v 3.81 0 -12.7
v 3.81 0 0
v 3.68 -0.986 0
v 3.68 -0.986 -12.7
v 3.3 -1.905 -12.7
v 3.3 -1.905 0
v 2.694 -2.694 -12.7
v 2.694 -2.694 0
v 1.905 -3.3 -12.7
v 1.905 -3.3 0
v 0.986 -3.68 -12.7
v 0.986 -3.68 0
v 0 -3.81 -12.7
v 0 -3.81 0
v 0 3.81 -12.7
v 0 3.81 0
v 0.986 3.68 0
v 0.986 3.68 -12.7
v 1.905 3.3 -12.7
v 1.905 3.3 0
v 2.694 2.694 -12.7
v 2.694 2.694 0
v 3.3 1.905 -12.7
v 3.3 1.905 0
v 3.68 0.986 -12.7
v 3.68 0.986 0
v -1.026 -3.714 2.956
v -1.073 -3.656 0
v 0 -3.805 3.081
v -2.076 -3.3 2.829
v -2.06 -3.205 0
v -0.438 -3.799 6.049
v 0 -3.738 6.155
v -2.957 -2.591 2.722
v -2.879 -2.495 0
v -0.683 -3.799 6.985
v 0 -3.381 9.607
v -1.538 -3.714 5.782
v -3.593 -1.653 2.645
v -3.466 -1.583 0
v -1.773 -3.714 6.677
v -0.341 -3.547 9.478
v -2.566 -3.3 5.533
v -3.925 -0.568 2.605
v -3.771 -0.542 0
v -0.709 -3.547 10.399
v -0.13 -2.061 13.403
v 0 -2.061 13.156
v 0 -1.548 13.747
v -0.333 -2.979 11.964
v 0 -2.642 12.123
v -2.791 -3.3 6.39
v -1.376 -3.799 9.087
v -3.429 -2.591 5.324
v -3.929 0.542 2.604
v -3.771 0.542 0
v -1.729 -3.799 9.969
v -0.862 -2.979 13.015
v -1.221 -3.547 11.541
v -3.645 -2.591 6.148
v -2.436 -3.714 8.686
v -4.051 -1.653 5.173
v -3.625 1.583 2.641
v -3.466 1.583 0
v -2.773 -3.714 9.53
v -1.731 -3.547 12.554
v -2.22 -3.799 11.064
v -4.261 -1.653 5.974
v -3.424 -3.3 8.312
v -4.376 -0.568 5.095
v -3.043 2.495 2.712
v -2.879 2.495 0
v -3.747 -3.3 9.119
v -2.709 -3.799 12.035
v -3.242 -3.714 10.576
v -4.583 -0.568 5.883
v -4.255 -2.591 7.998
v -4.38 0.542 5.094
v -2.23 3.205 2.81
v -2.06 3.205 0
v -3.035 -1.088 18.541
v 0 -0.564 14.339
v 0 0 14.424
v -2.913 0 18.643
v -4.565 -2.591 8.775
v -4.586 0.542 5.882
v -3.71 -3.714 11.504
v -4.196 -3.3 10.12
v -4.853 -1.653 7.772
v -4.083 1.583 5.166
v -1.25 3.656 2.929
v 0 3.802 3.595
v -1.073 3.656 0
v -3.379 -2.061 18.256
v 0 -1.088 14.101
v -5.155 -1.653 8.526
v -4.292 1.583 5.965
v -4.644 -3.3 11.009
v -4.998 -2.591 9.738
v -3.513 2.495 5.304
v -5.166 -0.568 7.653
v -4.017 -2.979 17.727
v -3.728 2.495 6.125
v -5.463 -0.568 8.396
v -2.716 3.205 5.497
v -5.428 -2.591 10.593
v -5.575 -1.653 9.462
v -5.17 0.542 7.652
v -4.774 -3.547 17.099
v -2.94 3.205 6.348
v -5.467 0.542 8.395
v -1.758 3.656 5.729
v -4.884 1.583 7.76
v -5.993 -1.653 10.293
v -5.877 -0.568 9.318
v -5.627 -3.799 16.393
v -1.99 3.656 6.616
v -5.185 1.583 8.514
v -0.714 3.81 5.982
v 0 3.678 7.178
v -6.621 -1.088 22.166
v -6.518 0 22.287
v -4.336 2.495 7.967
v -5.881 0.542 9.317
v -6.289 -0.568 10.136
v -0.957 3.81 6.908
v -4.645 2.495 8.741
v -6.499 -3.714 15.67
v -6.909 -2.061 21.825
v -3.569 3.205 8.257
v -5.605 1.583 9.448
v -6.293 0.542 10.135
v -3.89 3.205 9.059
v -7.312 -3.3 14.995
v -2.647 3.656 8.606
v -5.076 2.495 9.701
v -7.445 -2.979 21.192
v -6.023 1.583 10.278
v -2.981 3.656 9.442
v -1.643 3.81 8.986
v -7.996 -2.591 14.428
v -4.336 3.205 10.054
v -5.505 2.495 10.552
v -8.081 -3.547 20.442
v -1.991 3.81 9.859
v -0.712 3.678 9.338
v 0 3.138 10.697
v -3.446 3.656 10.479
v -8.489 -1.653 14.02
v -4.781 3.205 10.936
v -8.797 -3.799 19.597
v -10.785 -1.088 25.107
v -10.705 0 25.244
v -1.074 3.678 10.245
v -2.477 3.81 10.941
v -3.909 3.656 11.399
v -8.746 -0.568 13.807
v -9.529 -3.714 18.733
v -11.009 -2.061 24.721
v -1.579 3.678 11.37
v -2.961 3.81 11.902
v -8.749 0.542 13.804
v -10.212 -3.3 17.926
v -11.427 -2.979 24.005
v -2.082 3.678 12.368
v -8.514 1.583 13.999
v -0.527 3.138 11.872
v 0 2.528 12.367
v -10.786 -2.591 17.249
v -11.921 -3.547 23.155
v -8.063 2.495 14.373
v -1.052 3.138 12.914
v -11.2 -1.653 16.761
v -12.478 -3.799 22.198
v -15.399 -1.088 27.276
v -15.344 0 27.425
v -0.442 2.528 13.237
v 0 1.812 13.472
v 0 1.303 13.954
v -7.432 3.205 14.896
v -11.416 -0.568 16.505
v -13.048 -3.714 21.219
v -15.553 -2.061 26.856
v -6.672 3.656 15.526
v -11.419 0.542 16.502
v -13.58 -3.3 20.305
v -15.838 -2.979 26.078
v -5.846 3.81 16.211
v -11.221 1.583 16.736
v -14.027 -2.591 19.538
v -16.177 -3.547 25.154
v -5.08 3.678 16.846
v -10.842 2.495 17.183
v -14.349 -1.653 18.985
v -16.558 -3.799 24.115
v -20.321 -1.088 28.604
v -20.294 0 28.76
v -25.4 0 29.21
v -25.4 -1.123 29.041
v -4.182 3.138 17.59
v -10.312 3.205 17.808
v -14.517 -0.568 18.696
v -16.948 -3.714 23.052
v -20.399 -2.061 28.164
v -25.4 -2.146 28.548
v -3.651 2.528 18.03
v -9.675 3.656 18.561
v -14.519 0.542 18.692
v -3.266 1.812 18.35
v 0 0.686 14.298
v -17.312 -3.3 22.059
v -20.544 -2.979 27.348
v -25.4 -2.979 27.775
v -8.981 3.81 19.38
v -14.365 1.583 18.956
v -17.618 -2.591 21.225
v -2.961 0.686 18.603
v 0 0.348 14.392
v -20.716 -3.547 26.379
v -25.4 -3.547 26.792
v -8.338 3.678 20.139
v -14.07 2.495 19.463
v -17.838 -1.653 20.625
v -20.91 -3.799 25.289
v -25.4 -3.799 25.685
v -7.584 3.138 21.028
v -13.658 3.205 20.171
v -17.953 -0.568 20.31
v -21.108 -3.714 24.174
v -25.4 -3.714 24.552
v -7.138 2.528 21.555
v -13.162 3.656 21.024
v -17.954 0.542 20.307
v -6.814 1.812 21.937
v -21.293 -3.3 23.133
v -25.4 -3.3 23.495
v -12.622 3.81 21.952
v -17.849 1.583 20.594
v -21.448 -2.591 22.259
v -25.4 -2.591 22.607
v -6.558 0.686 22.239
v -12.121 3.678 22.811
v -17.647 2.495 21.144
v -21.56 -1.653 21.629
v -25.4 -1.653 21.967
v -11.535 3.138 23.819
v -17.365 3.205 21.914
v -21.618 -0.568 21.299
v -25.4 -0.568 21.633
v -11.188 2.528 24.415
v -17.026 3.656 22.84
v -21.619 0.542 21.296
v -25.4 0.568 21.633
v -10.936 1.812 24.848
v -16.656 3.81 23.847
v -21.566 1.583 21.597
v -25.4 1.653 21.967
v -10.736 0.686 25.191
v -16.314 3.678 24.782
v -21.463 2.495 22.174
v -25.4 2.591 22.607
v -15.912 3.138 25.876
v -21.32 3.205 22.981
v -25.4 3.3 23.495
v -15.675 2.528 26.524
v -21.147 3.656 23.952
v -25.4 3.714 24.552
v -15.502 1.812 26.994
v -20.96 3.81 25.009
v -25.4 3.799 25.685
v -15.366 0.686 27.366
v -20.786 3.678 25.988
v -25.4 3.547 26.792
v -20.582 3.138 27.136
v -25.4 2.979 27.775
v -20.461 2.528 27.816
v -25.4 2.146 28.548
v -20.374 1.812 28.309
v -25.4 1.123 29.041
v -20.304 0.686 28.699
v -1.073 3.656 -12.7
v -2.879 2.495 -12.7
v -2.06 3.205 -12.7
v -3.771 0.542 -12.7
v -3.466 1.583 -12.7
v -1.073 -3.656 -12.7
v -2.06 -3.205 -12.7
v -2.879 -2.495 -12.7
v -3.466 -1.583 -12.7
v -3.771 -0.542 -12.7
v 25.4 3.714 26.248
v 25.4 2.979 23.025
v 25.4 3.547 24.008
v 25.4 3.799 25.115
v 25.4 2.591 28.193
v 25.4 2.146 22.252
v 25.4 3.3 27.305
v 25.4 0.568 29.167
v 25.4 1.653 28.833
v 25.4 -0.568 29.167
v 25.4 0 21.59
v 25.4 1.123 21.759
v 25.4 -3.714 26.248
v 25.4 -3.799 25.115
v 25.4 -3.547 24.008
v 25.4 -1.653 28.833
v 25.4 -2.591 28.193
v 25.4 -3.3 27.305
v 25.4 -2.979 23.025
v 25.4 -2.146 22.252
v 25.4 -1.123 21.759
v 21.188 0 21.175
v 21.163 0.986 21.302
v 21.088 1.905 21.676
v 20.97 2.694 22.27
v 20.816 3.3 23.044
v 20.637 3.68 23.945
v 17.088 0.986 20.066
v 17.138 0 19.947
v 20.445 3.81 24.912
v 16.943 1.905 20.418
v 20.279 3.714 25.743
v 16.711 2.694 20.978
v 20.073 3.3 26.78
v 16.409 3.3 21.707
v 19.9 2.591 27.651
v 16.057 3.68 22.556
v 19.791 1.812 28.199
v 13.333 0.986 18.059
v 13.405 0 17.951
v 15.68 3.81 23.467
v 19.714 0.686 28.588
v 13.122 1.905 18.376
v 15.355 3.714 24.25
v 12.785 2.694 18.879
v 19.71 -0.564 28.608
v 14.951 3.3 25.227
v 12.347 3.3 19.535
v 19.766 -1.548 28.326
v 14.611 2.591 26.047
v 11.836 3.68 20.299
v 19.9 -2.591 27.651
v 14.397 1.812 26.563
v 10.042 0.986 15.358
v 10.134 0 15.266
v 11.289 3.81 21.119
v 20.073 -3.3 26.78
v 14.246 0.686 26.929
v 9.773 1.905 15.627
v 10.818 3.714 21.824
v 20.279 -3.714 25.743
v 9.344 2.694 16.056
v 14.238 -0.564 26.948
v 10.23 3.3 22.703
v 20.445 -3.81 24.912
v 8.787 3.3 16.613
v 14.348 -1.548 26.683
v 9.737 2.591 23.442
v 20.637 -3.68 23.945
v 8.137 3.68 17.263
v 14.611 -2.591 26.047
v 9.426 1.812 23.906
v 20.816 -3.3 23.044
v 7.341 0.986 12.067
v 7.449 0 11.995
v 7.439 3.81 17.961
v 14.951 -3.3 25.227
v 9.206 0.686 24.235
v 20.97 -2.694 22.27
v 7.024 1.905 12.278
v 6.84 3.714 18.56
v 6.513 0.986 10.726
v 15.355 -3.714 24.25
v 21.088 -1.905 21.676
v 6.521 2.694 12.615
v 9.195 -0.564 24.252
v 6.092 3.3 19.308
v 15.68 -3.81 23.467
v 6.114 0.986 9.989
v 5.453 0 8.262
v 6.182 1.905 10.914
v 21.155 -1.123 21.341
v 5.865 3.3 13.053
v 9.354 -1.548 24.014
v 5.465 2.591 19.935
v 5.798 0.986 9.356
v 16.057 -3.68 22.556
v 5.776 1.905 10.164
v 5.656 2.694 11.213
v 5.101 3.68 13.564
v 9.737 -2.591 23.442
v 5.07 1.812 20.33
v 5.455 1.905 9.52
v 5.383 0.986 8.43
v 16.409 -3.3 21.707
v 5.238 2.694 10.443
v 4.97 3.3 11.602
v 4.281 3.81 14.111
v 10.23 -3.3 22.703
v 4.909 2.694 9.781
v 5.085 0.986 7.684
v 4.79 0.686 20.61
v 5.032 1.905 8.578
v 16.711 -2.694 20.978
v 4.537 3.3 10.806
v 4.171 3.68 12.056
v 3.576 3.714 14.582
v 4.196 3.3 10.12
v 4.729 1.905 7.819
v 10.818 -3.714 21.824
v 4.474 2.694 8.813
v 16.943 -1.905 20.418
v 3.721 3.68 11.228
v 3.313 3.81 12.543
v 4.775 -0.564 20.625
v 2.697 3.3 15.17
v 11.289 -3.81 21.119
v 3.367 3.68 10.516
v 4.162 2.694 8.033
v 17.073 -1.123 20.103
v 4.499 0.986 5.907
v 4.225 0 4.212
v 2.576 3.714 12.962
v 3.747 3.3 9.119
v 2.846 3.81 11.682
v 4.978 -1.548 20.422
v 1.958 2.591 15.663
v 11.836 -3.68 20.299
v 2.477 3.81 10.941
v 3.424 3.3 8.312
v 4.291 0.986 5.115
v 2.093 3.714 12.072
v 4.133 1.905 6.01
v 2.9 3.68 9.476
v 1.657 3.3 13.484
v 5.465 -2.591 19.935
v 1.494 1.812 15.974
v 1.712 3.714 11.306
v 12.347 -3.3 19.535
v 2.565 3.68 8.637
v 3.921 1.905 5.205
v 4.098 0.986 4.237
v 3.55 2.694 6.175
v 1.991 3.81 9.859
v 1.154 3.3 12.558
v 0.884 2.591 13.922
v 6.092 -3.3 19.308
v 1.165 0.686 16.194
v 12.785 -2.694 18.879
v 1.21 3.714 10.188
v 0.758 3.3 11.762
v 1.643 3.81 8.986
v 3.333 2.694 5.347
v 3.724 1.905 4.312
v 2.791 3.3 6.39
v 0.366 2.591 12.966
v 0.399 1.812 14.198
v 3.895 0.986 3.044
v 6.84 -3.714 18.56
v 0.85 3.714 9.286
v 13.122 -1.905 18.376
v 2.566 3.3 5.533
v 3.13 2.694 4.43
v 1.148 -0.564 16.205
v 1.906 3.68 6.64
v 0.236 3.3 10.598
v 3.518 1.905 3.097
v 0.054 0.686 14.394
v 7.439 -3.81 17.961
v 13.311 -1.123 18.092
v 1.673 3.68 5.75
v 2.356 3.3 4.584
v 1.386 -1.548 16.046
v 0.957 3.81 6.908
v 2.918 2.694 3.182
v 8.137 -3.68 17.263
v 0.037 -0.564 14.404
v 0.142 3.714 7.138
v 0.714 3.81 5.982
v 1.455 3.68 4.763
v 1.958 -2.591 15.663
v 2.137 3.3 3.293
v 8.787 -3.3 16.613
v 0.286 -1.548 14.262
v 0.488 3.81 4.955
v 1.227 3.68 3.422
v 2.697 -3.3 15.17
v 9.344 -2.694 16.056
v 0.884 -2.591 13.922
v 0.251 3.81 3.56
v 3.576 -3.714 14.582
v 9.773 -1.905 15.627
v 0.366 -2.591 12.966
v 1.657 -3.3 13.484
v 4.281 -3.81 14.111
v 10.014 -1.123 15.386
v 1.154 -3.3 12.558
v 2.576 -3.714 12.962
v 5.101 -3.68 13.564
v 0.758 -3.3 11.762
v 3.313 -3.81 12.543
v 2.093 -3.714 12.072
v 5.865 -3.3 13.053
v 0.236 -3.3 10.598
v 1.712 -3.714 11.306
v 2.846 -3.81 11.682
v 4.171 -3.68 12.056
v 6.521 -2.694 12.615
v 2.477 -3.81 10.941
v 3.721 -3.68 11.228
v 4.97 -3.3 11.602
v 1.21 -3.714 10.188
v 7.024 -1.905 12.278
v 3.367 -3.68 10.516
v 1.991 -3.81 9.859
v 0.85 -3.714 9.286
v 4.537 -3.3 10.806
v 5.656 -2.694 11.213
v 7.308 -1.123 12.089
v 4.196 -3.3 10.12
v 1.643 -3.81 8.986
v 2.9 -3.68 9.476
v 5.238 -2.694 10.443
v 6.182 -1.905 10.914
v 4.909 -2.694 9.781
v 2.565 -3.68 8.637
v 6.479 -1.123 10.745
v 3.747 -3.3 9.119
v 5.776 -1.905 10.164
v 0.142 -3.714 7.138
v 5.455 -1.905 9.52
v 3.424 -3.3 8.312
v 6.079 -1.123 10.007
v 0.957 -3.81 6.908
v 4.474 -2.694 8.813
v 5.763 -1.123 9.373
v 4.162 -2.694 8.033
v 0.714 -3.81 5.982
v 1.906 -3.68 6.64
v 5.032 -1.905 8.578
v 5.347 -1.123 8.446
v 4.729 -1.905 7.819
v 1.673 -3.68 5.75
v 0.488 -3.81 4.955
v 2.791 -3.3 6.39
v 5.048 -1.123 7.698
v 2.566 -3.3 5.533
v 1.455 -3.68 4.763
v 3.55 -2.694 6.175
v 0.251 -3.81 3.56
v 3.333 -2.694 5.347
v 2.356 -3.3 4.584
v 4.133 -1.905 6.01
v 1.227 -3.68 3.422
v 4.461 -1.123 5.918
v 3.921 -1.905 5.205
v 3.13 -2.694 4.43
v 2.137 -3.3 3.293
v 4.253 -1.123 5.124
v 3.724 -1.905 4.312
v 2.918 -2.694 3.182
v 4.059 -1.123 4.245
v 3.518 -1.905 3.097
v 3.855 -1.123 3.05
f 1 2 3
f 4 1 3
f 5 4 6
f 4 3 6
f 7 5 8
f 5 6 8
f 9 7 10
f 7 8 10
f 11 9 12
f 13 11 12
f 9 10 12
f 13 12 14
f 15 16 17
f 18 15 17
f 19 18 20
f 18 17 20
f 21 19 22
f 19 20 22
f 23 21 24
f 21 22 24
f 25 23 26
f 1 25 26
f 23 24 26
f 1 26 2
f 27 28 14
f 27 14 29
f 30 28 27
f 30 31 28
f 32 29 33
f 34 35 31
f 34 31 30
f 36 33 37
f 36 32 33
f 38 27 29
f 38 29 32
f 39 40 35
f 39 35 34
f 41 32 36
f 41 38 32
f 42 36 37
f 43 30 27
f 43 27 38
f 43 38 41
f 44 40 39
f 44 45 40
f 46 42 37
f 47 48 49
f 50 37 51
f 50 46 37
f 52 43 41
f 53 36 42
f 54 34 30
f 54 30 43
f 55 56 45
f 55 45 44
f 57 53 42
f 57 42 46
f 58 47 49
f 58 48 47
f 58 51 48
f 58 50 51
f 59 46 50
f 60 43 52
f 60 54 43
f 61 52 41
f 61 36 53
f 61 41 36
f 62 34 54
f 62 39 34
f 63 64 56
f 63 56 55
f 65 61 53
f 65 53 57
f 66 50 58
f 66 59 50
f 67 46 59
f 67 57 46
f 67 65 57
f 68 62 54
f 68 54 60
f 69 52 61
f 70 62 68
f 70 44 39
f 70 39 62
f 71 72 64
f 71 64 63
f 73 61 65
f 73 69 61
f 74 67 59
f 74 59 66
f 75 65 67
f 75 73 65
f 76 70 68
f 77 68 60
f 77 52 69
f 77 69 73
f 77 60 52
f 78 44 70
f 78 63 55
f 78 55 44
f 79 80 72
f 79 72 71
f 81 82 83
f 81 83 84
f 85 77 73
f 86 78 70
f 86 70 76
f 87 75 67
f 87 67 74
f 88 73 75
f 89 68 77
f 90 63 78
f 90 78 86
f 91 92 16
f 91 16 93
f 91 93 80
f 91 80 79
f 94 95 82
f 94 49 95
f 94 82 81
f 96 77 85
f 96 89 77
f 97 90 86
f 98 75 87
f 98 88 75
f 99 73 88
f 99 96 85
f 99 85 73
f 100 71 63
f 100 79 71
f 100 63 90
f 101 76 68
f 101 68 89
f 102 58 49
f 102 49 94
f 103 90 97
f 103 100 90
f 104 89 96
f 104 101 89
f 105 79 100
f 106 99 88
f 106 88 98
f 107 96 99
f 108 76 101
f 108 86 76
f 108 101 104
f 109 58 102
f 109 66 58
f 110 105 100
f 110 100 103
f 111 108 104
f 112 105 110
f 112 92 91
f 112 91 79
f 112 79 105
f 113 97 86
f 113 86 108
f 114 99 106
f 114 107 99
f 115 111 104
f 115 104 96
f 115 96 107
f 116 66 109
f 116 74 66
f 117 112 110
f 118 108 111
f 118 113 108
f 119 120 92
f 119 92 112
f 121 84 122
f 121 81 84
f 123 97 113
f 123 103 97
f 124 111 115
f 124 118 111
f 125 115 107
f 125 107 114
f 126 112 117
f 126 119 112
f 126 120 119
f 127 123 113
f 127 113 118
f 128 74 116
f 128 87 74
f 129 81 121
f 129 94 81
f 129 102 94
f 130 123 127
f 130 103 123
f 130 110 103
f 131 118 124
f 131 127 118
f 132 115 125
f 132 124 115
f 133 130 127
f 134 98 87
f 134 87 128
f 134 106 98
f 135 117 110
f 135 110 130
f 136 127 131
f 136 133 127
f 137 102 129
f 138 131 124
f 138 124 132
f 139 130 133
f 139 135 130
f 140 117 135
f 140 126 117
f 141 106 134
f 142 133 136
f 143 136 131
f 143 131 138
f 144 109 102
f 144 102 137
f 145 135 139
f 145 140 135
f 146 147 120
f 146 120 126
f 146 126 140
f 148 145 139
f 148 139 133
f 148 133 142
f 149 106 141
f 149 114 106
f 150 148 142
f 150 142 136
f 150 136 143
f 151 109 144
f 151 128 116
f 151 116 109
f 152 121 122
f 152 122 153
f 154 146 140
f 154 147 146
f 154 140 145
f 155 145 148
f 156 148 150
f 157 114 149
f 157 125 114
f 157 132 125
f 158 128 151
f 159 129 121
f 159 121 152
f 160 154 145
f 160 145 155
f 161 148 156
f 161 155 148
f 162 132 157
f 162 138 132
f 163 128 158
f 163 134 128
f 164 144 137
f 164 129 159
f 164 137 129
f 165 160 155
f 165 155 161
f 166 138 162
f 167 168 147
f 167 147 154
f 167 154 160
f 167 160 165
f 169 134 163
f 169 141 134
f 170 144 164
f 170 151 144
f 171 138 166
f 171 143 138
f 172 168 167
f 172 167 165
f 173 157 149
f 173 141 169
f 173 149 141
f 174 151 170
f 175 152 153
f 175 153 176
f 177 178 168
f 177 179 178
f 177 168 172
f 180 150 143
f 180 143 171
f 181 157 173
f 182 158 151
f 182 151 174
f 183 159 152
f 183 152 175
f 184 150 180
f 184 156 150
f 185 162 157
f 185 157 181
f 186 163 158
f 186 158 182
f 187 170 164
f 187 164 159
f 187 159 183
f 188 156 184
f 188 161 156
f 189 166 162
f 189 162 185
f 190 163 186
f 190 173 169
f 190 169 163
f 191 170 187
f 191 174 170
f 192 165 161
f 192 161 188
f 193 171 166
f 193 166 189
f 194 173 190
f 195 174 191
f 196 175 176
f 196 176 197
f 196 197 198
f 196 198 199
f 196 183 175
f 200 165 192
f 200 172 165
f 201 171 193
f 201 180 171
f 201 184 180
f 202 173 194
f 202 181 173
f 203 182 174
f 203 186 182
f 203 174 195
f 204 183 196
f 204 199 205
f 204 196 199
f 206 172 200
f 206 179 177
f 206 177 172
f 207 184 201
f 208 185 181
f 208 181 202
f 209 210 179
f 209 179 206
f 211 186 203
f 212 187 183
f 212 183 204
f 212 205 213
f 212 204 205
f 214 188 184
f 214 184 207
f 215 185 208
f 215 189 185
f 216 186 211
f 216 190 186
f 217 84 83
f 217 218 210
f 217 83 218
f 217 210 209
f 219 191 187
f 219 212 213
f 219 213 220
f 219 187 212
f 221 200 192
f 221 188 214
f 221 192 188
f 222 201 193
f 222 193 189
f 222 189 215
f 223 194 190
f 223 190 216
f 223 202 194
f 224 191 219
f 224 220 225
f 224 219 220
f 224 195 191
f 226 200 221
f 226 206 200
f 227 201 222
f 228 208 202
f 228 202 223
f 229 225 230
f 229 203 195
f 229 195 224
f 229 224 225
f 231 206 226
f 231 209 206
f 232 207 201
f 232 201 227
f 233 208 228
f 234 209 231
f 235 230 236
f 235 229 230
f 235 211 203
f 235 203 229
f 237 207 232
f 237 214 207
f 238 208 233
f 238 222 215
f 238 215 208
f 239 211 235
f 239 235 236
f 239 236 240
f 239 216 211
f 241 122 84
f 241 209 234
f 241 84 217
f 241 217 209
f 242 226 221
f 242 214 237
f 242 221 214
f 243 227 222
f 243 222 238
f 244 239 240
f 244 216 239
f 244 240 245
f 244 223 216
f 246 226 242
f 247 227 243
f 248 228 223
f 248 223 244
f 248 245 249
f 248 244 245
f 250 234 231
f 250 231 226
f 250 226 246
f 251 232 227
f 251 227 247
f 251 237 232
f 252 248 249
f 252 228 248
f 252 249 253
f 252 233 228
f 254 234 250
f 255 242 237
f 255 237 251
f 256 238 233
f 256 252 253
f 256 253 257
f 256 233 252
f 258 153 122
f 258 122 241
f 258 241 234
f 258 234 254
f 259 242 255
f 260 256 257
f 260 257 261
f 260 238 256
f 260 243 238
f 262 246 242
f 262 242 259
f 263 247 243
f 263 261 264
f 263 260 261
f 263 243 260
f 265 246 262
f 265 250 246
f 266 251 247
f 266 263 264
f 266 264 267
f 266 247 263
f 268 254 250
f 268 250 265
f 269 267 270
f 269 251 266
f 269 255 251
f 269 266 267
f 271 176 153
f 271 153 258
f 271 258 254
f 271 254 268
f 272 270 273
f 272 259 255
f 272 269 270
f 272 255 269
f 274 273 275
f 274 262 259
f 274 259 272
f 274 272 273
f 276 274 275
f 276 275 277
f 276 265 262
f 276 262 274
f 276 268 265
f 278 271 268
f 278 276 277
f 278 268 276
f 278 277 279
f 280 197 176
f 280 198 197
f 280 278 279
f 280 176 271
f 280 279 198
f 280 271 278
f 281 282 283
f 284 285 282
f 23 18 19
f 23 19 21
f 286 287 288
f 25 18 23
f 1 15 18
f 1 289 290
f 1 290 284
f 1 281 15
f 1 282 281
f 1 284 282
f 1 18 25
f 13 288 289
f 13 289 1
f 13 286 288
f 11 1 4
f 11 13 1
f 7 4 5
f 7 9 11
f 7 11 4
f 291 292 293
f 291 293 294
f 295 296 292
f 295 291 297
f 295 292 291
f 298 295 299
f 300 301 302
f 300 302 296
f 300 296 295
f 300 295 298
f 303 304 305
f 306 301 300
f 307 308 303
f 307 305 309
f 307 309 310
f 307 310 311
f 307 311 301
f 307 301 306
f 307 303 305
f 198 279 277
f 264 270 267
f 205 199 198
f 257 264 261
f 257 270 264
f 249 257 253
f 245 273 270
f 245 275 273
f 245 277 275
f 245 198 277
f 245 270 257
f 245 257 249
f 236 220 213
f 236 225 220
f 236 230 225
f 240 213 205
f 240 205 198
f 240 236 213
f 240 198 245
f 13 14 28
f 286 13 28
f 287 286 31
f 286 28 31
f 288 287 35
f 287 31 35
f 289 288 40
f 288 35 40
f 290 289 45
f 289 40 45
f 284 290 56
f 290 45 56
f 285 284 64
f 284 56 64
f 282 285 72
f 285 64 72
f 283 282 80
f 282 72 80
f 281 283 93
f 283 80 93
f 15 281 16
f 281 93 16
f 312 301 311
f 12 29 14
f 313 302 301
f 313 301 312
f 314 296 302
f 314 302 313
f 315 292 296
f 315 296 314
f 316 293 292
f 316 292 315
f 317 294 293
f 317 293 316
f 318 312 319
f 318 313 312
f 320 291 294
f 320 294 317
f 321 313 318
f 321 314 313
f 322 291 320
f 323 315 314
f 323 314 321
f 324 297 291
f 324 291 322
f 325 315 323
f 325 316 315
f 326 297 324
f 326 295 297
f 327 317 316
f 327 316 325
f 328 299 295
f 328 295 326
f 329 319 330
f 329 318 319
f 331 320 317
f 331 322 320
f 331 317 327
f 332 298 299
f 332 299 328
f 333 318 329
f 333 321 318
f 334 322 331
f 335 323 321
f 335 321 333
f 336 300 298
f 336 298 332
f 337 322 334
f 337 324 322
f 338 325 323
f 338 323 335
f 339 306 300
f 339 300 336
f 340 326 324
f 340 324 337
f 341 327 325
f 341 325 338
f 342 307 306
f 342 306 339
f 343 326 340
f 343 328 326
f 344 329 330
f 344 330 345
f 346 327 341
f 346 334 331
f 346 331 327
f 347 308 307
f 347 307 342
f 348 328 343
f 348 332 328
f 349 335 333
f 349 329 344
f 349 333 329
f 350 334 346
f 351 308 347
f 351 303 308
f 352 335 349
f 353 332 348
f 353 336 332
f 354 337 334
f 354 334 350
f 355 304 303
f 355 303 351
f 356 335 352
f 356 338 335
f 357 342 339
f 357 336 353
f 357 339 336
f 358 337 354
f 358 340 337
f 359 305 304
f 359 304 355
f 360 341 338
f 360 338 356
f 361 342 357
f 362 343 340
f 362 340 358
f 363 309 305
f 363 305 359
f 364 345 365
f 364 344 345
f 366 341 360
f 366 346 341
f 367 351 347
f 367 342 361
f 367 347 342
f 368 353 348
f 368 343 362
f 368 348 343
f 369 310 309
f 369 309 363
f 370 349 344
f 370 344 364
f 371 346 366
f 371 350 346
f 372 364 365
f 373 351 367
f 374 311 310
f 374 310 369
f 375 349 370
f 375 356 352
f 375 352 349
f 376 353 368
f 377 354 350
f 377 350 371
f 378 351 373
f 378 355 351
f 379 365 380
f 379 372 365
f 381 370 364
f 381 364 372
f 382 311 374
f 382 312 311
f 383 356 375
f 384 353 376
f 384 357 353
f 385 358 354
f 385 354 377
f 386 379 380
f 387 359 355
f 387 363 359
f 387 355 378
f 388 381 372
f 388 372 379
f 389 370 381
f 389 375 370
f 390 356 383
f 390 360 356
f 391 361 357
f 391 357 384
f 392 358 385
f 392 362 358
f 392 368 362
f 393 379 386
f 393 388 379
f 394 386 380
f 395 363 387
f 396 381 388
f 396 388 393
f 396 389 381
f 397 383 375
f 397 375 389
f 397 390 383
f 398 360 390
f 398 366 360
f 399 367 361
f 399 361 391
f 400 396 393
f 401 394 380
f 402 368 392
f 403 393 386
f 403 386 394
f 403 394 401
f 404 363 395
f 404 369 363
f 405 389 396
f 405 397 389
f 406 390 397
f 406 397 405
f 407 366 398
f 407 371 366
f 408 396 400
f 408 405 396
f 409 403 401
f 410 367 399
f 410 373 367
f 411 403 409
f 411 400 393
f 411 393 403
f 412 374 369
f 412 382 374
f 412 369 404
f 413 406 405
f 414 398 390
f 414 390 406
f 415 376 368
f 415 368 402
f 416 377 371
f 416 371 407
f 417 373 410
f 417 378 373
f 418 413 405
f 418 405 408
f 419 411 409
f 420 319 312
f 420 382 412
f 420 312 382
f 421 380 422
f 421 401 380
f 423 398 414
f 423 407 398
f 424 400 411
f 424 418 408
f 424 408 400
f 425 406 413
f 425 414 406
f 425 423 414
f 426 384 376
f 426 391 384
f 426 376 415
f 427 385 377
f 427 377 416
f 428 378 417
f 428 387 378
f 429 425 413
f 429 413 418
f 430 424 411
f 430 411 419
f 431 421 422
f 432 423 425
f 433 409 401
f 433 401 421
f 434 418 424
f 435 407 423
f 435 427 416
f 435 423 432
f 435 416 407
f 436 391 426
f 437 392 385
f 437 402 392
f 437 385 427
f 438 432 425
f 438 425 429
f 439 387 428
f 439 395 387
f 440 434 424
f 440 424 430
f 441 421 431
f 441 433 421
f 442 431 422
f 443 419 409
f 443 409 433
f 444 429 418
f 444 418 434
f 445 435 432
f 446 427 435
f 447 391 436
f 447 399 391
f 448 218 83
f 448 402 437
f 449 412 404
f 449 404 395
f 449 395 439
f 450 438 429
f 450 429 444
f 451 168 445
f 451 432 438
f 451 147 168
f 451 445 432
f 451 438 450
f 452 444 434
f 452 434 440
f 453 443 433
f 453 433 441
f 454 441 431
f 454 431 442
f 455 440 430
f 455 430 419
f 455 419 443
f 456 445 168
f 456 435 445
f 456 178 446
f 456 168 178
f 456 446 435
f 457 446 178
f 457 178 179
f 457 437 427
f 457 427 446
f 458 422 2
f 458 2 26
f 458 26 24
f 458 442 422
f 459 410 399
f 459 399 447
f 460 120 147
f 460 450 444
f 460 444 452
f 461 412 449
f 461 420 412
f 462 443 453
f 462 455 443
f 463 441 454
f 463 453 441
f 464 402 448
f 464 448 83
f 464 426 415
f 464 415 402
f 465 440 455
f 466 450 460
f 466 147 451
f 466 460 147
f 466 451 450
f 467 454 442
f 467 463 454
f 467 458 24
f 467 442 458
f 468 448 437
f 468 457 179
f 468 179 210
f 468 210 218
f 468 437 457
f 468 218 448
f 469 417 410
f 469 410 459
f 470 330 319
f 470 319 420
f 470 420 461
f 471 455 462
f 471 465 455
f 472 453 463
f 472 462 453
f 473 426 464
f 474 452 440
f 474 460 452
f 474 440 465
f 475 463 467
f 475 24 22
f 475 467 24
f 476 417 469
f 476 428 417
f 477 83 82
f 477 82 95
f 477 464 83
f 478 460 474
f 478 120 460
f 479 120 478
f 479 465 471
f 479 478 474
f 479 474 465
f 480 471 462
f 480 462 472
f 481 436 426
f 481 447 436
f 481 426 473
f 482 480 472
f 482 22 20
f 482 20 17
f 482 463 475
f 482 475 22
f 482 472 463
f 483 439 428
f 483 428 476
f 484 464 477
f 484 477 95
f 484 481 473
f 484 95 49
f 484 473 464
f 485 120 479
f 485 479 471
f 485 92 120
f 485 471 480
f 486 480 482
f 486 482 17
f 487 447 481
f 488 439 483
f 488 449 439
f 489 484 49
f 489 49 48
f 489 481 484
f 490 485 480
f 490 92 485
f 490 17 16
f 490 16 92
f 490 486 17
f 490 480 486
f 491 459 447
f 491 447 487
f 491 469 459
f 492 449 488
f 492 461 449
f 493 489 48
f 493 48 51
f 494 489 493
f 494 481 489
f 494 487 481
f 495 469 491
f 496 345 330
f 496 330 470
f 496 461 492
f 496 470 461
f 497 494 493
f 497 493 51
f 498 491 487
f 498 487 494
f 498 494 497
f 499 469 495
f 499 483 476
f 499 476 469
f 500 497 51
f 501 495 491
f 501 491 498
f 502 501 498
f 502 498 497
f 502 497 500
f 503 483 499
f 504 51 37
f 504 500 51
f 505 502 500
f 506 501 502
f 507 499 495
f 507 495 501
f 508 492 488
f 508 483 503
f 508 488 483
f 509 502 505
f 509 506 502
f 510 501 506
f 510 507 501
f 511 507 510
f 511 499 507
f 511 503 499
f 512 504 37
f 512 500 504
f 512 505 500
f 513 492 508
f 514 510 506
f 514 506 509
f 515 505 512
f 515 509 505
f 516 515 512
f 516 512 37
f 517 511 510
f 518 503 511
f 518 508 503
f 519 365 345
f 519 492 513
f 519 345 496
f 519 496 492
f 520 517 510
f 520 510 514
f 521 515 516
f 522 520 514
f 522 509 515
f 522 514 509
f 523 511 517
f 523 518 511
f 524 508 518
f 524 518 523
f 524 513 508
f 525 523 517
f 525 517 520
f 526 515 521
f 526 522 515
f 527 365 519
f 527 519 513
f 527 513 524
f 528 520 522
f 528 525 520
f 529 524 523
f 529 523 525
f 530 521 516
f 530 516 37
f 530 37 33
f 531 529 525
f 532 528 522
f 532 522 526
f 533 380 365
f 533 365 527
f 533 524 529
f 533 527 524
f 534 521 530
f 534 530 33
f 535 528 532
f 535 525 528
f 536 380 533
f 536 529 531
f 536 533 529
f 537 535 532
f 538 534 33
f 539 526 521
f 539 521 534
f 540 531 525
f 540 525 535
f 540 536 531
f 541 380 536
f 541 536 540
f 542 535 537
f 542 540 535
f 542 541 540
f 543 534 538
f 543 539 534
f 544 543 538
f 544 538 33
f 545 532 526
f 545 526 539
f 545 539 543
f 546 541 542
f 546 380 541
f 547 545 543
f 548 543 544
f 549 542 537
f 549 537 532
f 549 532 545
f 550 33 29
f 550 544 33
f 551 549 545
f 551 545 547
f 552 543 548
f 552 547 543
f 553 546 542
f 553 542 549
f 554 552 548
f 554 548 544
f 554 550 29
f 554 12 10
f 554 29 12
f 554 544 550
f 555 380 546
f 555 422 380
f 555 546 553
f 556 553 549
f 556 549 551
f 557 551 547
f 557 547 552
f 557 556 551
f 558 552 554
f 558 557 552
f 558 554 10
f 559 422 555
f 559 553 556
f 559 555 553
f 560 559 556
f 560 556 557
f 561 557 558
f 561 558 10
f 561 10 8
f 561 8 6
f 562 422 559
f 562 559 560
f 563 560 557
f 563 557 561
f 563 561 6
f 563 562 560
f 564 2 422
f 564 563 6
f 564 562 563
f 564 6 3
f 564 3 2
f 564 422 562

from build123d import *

# Parameters (mm, degrees)
F0_R     = 3.81
F4_DEPTH = 12.7


with BuildPart() as f2:
    # F2: sweep along a path in F1
    with BuildLine(Plane.XZ) as f2_path:
        ThreePointArc((25.4, 25.4), (7.439488, 17.960512), (0, 0))
    # F0 (on Top) → F2 (sweep)
    with BuildSketch(Plane.XY):
        Circle(F0_R)
    sweep(path=f2_path.line)

    # F3: sweep along a path in F1
    with BuildLine(Plane.XZ) as f3_path:
        ThreePointArc((0, 0), (-7.439488, 17.960512), (-25.4, 25.4))
    # F0 (on Top) → F3 (sweep)
    with BuildSketch(Plane.XY):
        Circle(F0_R)
    sweep(path=f3_path.line)

    # F2_face (on face) → F4 (join)
    with BuildSketch(Plane(origin=(0, 0, 0), x_dir=(1, 0, 0), z_dir=(0, 0, -1))):
        with BuildLine():
            ThreePointArc((0, -3.81), (2.694077, -2.694077), (3.81, 0))
            ThreePointArc((3.81, 0), (2.694077, 2.694077), (0, 3.81))
            ThreePointArc((0, 3.81), (-3.81, 0), (0, -3.81))
        make_face()
    extrude(amount=F4_DEPTH)


solid = f2.part
